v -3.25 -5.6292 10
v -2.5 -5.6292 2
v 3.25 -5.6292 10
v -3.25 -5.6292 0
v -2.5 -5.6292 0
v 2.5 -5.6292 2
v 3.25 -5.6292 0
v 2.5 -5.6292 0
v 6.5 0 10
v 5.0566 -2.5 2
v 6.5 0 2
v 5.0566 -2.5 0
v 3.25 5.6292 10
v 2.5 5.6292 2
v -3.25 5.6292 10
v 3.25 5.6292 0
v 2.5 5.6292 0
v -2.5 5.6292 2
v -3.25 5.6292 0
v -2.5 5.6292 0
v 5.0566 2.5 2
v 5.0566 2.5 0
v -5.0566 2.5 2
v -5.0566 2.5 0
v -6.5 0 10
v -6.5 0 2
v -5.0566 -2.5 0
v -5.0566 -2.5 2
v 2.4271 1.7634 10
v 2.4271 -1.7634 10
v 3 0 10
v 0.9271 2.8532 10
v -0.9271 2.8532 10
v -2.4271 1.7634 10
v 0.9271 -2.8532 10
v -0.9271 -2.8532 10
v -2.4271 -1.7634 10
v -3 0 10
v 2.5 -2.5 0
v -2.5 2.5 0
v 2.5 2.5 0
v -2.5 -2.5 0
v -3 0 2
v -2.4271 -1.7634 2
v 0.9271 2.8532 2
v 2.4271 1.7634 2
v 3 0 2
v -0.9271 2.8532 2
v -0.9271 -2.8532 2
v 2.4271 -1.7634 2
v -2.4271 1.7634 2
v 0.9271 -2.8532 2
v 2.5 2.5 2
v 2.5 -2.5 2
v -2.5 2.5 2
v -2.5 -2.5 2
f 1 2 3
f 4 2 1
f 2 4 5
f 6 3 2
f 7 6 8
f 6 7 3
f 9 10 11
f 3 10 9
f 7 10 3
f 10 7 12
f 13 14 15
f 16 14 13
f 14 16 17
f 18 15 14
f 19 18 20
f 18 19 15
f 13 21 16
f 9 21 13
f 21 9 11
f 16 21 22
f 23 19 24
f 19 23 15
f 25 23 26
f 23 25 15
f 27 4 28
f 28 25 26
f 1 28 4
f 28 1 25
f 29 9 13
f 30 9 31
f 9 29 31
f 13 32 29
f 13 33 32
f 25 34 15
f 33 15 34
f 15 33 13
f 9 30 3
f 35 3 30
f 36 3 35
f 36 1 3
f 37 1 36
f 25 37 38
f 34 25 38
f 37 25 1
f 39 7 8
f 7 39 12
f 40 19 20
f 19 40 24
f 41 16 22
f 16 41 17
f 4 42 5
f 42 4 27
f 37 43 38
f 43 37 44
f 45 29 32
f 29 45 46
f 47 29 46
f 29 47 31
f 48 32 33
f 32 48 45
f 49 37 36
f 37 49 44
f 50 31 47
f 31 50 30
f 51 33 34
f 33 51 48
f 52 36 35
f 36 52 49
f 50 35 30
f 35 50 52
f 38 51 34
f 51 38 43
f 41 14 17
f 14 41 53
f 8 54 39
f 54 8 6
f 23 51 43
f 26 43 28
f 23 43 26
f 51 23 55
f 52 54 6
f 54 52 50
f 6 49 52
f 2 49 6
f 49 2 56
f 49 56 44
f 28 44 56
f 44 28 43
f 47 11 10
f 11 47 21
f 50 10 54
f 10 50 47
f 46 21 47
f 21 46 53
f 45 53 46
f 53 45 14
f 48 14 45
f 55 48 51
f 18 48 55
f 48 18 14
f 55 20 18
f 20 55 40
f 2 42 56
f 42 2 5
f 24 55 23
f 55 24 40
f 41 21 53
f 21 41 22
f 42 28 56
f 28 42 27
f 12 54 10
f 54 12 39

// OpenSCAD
difference()
{
    cylinder(r=13/2,h=10, $fn=6);
    cylinder(r=6/2,h=10);
    translate([0,0,2/2])cube([5,15,2], center=true);
    translate([0,0,2/2])cube([15,5,2], center=true);
}
